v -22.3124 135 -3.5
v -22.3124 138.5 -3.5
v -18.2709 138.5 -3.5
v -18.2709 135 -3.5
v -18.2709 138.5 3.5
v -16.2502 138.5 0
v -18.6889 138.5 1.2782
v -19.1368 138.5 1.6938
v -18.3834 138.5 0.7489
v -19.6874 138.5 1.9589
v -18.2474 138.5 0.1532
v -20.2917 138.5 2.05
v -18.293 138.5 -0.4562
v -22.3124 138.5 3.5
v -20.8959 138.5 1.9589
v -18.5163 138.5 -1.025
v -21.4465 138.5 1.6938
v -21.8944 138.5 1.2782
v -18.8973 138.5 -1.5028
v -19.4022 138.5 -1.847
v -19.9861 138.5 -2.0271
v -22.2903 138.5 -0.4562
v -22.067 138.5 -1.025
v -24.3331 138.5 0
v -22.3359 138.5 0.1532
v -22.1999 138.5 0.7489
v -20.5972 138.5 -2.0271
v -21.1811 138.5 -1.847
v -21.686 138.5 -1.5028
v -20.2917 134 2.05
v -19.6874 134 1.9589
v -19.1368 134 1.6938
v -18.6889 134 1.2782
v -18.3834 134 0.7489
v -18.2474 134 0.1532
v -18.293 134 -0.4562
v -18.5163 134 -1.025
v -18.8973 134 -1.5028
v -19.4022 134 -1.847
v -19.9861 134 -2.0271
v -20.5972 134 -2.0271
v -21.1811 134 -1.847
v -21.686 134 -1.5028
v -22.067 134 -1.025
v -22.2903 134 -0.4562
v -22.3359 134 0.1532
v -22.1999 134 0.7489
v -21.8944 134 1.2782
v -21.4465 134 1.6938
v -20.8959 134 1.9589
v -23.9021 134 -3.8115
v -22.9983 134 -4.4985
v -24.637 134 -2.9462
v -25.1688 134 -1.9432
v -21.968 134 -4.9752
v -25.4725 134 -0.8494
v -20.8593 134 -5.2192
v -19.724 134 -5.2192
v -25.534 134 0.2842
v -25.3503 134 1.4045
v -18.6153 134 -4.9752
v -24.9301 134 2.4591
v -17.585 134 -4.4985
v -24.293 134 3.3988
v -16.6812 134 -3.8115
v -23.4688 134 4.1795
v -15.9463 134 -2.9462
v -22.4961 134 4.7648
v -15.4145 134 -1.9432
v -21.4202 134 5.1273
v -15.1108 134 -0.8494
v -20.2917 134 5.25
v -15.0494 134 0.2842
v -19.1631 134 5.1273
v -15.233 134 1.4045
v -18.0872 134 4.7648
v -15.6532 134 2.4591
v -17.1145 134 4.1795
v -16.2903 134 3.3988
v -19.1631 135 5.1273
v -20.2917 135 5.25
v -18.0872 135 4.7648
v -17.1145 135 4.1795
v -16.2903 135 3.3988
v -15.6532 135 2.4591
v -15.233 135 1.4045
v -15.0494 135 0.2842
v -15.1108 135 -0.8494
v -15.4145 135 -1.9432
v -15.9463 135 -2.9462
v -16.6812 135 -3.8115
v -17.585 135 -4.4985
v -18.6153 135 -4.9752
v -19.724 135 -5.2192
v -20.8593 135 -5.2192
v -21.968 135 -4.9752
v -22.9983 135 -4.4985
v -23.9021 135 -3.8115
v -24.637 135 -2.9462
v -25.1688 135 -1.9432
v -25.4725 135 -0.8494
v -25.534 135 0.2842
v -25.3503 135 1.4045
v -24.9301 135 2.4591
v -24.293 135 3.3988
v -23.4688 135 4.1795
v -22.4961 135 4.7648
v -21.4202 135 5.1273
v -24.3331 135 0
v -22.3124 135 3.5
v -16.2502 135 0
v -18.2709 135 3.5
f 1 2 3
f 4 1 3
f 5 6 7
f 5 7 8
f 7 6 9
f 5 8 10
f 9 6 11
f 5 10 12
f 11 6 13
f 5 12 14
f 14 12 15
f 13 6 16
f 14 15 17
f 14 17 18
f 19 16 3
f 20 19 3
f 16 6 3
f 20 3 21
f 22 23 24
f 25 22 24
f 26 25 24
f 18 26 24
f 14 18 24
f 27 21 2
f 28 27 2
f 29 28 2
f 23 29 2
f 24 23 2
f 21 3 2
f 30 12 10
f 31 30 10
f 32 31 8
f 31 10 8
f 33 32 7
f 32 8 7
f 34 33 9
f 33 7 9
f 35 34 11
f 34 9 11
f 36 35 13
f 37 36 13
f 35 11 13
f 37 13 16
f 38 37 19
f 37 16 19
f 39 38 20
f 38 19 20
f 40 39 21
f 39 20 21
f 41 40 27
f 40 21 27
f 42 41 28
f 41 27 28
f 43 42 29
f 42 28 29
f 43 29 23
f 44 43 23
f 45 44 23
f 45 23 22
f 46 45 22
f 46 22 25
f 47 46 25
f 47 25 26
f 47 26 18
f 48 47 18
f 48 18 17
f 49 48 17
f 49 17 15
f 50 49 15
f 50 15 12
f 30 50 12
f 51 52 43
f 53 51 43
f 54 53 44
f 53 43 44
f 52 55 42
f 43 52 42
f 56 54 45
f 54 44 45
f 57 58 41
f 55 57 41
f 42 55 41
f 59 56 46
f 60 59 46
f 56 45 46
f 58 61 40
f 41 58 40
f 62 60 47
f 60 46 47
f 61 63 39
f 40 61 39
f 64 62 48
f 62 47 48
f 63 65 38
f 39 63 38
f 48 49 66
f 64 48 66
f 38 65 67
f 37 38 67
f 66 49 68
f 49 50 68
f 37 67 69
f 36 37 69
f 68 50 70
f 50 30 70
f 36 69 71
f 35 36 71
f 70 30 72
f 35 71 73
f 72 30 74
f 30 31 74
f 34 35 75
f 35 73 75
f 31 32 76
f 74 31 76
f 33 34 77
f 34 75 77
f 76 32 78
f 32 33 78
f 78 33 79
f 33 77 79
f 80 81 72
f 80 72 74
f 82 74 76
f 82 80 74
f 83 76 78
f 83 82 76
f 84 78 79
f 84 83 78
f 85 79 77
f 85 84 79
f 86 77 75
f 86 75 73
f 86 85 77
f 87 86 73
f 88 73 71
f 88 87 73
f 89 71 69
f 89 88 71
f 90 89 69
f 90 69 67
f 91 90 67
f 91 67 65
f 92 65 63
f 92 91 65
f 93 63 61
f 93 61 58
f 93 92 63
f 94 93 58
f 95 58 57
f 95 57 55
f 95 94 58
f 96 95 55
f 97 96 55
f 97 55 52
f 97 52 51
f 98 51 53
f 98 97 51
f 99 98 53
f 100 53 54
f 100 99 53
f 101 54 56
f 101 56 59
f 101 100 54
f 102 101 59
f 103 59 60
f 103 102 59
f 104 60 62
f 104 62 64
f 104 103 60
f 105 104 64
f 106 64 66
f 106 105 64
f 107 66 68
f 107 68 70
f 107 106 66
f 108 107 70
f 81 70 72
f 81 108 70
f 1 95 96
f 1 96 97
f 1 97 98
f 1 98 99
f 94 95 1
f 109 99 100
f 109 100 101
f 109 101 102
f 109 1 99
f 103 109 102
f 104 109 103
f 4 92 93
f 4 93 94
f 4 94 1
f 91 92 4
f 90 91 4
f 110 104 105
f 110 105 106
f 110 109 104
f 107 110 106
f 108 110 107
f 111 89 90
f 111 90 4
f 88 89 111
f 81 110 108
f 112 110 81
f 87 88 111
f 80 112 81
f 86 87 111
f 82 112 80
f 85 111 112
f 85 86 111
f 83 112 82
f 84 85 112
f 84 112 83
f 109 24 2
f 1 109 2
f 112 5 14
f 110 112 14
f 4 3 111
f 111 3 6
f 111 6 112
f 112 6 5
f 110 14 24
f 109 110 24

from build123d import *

# Parameters (mm, degrees)
HEX_NUT_DEPTH                     = 3.5
NUT_FLANGE_SKETCH_R               = 5.25
NUT_FLANGE_DEPTH                  = 1
M4_INTERNAL_THREAD_BLANK_SKETCH_R = 2.05
M4_INTERNAL_THREAD_BLANK_DEPTH    = 4.7


with BuildPart() as part:
    # Hex Nut Sketch → Hex Nut (new body)
    with BuildSketch(Plane(origin=(0, 138.5, 0), x_dir=(1, 0, 0), z_dir=(0, 1, 0))):
        Polygon((-16.250199362, 0), (-18.270925304, -3.5), (-22.312377188, -3.5), (-24.33310313, 0), (-22.312377188, 3.5), (-18.270925304, 3.5), align=None)
    extrude(amount=-HEX_NUT_DEPTH)

    # Nut Flange Sketch → Nut Flange (add)
    with BuildSketch(Plane(origin=(0, 135, 0), x_dir=(1, 0, 0), z_dir=(0, 1, 0))):
        with Locations(Location((-20.291651246, 0, 0), (0, 0, 270))):
            Circle(NUT_FLANGE_SKETCH_R)
    extrude(amount=-NUT_FLANGE_DEPTH)

    # M4 Internal Thread Blank Sketch → M4 Internal Thread Blank (cut)
    with BuildSketch(Plane(origin=(0, 138.6, 0), x_dir=(1, 0, 0), z_dir=(0, 1, 0))):
        with Locations(Location((-20.291651246, 0, 0), (0, 0, 270))):
            Circle(M4_INTERNAL_THREAD_BLANK_SKETCH_R)
    extrude(amount=-M4_INTERNAL_THREAD_BLANK_DEPTH, mode=Mode.SUBTRACT)


solid = part.part
